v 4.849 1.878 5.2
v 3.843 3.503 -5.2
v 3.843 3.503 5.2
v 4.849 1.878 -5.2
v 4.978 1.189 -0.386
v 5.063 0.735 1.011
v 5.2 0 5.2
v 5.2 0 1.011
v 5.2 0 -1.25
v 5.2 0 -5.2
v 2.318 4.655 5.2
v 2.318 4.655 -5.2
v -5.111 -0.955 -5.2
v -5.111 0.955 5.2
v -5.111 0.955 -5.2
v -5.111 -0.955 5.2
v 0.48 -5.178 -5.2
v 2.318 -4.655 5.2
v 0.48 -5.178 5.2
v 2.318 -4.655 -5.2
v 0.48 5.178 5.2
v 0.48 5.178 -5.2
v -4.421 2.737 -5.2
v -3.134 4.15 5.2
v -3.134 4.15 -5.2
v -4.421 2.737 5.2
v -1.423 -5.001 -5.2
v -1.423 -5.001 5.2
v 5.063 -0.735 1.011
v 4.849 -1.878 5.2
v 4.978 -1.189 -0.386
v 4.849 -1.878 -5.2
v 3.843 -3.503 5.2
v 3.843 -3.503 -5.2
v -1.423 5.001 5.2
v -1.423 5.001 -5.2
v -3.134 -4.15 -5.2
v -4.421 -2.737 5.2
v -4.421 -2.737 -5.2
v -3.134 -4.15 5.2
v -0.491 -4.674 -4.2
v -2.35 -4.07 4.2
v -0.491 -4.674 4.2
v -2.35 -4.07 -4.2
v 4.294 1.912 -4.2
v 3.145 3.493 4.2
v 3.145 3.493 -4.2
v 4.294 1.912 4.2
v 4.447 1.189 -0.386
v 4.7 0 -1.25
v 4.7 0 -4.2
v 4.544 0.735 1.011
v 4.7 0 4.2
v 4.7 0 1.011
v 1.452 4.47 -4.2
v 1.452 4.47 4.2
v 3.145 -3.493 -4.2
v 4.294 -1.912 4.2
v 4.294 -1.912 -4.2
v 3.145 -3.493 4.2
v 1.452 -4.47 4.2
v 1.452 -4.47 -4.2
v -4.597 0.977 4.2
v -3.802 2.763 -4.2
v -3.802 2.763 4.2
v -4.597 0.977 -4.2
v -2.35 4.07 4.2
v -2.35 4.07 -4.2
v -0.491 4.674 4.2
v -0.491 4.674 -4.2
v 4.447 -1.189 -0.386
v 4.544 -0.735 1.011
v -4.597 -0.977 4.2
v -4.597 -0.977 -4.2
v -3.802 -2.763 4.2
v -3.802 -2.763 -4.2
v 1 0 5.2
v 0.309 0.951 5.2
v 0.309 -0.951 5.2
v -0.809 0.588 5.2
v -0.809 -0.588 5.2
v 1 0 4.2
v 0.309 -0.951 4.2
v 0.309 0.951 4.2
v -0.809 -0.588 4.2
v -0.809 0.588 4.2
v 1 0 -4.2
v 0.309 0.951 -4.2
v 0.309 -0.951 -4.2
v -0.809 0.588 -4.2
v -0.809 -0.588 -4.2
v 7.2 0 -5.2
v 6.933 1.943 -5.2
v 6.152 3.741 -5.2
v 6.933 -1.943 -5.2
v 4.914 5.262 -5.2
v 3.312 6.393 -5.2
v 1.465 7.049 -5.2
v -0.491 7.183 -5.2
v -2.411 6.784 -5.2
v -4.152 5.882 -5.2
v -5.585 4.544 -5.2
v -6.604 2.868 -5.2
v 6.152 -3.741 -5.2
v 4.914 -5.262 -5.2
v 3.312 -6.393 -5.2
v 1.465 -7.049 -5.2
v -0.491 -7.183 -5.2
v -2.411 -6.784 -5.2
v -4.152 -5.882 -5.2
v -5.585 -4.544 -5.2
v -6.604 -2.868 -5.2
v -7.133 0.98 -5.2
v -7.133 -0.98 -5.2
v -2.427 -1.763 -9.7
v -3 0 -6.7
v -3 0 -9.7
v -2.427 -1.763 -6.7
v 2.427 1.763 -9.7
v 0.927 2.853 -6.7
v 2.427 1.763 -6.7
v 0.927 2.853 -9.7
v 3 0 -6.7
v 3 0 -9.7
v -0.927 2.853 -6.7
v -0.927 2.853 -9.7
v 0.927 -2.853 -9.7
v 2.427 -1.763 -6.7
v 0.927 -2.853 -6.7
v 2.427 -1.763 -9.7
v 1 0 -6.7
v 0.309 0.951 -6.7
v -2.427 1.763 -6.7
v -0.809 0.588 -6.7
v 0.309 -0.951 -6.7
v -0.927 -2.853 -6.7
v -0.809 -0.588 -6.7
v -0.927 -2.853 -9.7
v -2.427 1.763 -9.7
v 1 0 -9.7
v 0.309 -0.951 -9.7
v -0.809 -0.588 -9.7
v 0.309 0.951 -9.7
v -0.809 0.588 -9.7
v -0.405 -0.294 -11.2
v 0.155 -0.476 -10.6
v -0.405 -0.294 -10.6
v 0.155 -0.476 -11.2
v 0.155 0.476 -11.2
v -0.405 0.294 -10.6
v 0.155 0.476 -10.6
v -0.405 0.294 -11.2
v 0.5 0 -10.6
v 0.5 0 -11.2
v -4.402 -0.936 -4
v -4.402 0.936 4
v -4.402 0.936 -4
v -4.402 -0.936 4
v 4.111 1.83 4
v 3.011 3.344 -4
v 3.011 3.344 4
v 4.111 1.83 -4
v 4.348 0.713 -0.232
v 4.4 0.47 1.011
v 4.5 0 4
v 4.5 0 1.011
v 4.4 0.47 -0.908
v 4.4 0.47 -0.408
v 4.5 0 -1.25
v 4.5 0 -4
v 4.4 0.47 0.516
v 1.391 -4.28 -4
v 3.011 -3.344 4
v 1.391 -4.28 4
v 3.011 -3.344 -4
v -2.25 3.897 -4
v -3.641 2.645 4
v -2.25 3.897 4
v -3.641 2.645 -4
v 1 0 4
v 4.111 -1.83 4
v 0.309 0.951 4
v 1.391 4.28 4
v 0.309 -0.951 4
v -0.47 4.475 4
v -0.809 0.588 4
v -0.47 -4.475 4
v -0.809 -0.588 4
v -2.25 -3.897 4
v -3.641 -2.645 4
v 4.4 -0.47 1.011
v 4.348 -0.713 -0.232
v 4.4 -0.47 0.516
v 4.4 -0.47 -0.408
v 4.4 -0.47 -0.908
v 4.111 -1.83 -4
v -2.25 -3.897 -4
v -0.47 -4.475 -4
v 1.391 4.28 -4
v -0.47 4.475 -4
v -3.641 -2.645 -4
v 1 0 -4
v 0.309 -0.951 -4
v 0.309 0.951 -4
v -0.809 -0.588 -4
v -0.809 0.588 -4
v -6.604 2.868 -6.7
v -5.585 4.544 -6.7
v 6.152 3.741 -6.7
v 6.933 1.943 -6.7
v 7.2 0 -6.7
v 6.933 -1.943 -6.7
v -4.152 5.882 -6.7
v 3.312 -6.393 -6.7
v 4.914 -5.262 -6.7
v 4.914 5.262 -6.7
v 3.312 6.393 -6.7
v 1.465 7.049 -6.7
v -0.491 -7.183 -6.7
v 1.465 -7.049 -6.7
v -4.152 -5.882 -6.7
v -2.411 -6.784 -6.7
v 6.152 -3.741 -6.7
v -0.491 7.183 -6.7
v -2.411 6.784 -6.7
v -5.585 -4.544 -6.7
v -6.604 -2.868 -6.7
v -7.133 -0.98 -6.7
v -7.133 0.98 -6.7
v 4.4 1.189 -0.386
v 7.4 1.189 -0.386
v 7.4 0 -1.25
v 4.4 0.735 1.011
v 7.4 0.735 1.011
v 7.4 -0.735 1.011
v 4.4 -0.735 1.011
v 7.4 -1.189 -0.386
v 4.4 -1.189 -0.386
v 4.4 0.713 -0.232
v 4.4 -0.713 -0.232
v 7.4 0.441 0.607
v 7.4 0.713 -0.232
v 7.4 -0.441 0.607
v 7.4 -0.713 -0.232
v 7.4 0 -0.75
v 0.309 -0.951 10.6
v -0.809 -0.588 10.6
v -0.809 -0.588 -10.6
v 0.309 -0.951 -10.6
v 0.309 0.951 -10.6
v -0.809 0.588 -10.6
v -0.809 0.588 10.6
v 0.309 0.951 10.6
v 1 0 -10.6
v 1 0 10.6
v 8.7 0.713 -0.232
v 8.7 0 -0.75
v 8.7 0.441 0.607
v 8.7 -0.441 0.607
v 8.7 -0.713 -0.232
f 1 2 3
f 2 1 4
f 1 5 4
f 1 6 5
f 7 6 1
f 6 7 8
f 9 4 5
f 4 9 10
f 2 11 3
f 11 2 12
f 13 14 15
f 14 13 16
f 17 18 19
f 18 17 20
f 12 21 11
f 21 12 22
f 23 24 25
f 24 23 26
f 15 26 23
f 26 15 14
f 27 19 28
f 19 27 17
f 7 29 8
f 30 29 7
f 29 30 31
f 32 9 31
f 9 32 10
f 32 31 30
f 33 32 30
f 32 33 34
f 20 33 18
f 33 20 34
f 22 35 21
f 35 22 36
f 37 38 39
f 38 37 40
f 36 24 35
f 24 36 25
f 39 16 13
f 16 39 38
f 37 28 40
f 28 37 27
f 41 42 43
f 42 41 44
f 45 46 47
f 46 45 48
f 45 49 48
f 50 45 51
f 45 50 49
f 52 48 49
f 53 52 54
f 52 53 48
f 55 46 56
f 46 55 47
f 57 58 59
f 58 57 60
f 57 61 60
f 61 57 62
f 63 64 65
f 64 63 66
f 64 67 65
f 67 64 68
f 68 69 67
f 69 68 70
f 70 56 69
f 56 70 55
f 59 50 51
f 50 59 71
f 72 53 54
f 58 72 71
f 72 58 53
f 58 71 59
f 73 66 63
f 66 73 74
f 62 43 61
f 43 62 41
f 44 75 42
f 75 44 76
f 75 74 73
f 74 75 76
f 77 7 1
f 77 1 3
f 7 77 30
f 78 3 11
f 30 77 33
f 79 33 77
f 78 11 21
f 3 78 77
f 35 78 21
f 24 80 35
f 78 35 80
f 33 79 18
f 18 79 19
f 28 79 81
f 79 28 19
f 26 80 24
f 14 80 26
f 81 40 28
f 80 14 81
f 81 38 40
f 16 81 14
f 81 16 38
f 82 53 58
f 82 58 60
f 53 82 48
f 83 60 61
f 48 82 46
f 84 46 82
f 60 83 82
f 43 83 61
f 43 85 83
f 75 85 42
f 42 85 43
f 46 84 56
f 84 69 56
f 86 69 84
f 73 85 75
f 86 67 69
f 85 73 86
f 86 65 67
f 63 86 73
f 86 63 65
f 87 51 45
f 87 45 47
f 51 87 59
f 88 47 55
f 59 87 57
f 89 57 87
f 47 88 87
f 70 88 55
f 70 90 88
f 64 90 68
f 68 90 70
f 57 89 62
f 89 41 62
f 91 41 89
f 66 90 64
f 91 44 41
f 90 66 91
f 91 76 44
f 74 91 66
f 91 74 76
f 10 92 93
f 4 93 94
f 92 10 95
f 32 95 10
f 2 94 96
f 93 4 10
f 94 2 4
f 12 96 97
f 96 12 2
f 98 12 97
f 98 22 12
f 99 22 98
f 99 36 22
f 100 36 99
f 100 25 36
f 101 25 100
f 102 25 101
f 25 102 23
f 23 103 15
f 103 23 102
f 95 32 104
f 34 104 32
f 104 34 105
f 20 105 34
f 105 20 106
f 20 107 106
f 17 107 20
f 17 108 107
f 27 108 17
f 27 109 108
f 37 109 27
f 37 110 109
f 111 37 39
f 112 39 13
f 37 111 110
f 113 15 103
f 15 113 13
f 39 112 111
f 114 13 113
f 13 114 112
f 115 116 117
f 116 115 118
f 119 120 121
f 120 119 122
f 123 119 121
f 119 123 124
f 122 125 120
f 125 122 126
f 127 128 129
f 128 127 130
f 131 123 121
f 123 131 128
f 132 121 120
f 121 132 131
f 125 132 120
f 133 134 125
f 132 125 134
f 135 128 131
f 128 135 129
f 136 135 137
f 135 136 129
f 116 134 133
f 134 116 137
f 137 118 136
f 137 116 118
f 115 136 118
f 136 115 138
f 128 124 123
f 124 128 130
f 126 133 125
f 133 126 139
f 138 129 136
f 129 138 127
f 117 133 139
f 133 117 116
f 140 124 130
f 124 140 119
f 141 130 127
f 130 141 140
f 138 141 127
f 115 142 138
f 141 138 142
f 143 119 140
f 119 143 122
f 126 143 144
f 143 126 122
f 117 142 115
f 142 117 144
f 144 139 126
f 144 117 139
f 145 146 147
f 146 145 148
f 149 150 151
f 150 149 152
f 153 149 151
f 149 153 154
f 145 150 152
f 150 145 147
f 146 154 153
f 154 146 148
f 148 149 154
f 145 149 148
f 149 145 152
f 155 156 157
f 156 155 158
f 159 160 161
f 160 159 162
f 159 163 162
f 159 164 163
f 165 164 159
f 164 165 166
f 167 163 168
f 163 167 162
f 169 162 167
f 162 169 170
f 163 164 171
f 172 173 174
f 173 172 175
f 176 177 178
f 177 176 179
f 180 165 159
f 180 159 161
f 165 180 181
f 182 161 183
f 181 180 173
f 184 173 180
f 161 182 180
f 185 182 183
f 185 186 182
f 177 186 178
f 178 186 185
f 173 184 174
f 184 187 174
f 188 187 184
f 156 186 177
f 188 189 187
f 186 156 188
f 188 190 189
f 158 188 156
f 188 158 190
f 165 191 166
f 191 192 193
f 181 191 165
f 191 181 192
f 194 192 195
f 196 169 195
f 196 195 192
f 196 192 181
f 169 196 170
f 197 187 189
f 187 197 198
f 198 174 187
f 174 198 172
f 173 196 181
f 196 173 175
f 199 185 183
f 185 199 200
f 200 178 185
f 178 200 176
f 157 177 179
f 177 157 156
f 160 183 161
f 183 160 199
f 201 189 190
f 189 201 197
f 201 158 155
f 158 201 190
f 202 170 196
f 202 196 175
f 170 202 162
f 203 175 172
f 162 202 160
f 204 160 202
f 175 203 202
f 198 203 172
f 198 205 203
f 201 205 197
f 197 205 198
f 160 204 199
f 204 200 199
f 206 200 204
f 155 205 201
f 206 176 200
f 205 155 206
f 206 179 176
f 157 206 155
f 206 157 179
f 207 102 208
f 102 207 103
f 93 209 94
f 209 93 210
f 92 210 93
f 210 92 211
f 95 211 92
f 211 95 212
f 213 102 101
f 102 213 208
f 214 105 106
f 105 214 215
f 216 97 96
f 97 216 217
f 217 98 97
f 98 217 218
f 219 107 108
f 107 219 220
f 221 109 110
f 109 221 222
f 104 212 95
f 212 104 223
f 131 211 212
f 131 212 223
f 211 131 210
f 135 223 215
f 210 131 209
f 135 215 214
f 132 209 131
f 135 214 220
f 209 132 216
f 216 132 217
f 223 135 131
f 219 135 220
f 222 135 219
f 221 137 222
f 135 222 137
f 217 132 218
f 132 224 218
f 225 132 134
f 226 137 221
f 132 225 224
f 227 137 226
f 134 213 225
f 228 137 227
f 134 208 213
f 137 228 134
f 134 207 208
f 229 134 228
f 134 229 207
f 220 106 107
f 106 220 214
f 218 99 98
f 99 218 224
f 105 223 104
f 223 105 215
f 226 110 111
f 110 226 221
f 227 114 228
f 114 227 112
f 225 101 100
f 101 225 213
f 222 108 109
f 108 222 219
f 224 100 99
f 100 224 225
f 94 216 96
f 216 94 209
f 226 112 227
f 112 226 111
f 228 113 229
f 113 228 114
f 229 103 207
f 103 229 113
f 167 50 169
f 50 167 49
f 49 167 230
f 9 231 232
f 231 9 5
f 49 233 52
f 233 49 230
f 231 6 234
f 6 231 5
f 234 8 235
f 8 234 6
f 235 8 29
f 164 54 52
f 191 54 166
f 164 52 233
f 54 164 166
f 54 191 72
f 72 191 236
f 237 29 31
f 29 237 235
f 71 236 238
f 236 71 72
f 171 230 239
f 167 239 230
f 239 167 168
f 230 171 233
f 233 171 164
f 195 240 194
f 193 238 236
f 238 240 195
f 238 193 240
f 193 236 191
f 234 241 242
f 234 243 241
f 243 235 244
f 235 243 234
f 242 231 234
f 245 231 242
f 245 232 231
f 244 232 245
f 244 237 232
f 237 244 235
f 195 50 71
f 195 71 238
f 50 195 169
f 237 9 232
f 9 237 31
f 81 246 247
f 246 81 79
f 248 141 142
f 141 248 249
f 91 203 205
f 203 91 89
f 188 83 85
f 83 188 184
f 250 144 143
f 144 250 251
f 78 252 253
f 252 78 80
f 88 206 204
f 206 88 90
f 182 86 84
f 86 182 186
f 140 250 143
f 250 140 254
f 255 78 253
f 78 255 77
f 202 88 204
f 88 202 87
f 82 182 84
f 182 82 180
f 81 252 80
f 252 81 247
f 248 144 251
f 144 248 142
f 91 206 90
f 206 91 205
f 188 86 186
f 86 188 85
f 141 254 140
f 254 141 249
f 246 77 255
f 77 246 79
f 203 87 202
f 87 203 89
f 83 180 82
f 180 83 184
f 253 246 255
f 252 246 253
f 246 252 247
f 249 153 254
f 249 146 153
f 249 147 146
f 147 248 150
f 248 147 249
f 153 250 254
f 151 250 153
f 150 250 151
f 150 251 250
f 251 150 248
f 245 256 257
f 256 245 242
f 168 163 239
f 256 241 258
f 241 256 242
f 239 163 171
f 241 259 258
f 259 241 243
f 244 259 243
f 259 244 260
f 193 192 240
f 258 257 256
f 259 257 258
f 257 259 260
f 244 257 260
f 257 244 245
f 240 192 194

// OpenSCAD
// Parameters
stator_diameter_mm = 9.0; //[4.5:18.0:0.1]
stator_height_mm = 8.0; //[4.0:16.0:0.1]
housing_wall_thickness_mm = 0.5; //[0.25:1.0:0.05]
housing_clearance_mm = 0.2; //[0.05:0.6:0.05]
shaft_diameter_mm = 2.0; //[1.0:4.0:0.1]
shaft_length_mm = 12.0; //[6.0:24.0:0.5]
endcap_thickness_mm = 1.0; //[0.5:2.0:0.1]
wire_port_diameter_mm = 1.5; //[0.8:3.0:0.1]
overlap_mm = 0.8; //[0.5:2.0:0.1]
housing_height_mm = 10.0; //[6.0:20.0:0.1]
flange_thickness_mm = 1.5; //[0.8:3.0:0.1]
flange_radial_extra_mm = 2.0; //[1.0:5.0:0.1]
wire_port_length_mm = 3.0; //[1.5:8.0:0.1]
buzzer_diameter_mm = 6.0; //[3.0:12.0:0.1]
buzzer_height_mm = 3.0; //[1.5:8.0:0.1]
buzzer_pin_diameter_mm = 1.0; //[0.5:2.0:0.1]
buzzer_pin_height_mm = 1.5; //[0.5:4.0:0.1]

// Buzzer - complete geometry
module buzzer() {
  color([0.8, 0.6, 0.2]) { // Brass-like color
    // Buzzer body
    cylinder(r=buzzer_diameter_mm/2, h=buzzer_height_mm, center=true);
    // Buzzer pin
    translate([0, 0, -buzzer_height_mm/2 - buzzer_pin_height_mm/2])
      cylinder(r=buzzer_pin_diameter_mm/2, h=buzzer_pin_height_mm, center=true);
  }
}

// Motor assembly
module assembly() {
  // Stator
  color("DimGray") {
    translate([0, 0, 0])
      cylinder(r=stator_diameter_mm/2, h=stator_height_mm, center=true);
  }
  
  // Housing
  color("Black") {
    difference() {
      translate([0, 0, 0])
        cylinder(r=stator_diameter_mm/2 + housing_clearance_mm + housing_wall_thickness_mm, h=housing_height_mm, center=true);
      translate([0, 0, 0])
        cylinder(r=stator_diameter_mm/2 + housing_clearance_mm, h=housing_height_mm + overlap_mm*2, center=true);
    }
  }
  
  // Endcaps
  color("Silver") {
    translate([0, 0, housing_height_mm/2 + endcap_thickness_mm/2 - overlap_mm])
      cylinder(r=stator_diameter_mm/2 + housing_clearance_mm + housing_wall_thickness_mm, h=endcap_thickness_mm, center=true);
    translate([0, 0, -housing_height_mm/2 - endcap_thickness_mm/2 + overlap_mm])
      cylinder(r=stator_diameter_mm/2 + housing_clearance_mm + housing_wall_thickness_mm, h=endcap_thickness_mm, center=true);
  }
  
  // Mounting flange
  color("Silver") {
    translate([0, 0, -housing_height_mm/2 - endcap_thickness_mm - flange_thickness_mm/2 + overlap_mm])
      cylinder(r=stator_diameter_mm/2 + housing_clearance_mm + housing_wall_thickness_mm + flange_radial_extra_mm, h=flange_thickness_mm, center=true);
  }
  
  // Wire port
  color("Black") {
    translate([stator_diameter_mm/2 + housing_clearance_mm + housing_wall_thickness_mm + wire_port_length_mm/2 - overlap_mm, 0, 0])
      rotate([0, 90, 0])
      cylinder(r=wire_port_diameter_mm/2 + housing_wall_thickness_mm, h=wire_port_length_mm, center=true);
  }
  
  // Central shaft
  color("Silver") {
    translate([0, 0, 0])
      cylinder(r=shaft_diameter_mm/2, h=shaft_length_mm, center=true);
  }
  
  // Buzzer feature
  translate([0, 0, -housing_height_mm/2 - endcap_thickness_mm - flange_thickness_mm - buzzer_height_mm/2 + overlap_mm])
    buzzer();
  
  // Shaft bore
  difference() {
    translate([0, 0, 0])
      cylinder(r=shaft_diameter_mm/2, h=housing_height_mm + endcap_thickness_mm*2 + flange_thickness_mm + buzzer_height_mm + buzzer_pin_height_mm + overlap_mm*4, center=true);
  }
  
  // Wire port hole
  difference() {
    translate([stator_diameter_mm/2 + housing_clearance_mm + housing_wall_thickness_mm + wire_port_length_mm/2 - overlap_mm, 0, 0])
      rotate([0, 90, 0])
      cylinder(r=wire_port_diameter_mm/2, h=wire_port_length_mm + housing_wall_thickness_mm*2 + overlap_mm*2, center=true);
  }
}

assembly();
